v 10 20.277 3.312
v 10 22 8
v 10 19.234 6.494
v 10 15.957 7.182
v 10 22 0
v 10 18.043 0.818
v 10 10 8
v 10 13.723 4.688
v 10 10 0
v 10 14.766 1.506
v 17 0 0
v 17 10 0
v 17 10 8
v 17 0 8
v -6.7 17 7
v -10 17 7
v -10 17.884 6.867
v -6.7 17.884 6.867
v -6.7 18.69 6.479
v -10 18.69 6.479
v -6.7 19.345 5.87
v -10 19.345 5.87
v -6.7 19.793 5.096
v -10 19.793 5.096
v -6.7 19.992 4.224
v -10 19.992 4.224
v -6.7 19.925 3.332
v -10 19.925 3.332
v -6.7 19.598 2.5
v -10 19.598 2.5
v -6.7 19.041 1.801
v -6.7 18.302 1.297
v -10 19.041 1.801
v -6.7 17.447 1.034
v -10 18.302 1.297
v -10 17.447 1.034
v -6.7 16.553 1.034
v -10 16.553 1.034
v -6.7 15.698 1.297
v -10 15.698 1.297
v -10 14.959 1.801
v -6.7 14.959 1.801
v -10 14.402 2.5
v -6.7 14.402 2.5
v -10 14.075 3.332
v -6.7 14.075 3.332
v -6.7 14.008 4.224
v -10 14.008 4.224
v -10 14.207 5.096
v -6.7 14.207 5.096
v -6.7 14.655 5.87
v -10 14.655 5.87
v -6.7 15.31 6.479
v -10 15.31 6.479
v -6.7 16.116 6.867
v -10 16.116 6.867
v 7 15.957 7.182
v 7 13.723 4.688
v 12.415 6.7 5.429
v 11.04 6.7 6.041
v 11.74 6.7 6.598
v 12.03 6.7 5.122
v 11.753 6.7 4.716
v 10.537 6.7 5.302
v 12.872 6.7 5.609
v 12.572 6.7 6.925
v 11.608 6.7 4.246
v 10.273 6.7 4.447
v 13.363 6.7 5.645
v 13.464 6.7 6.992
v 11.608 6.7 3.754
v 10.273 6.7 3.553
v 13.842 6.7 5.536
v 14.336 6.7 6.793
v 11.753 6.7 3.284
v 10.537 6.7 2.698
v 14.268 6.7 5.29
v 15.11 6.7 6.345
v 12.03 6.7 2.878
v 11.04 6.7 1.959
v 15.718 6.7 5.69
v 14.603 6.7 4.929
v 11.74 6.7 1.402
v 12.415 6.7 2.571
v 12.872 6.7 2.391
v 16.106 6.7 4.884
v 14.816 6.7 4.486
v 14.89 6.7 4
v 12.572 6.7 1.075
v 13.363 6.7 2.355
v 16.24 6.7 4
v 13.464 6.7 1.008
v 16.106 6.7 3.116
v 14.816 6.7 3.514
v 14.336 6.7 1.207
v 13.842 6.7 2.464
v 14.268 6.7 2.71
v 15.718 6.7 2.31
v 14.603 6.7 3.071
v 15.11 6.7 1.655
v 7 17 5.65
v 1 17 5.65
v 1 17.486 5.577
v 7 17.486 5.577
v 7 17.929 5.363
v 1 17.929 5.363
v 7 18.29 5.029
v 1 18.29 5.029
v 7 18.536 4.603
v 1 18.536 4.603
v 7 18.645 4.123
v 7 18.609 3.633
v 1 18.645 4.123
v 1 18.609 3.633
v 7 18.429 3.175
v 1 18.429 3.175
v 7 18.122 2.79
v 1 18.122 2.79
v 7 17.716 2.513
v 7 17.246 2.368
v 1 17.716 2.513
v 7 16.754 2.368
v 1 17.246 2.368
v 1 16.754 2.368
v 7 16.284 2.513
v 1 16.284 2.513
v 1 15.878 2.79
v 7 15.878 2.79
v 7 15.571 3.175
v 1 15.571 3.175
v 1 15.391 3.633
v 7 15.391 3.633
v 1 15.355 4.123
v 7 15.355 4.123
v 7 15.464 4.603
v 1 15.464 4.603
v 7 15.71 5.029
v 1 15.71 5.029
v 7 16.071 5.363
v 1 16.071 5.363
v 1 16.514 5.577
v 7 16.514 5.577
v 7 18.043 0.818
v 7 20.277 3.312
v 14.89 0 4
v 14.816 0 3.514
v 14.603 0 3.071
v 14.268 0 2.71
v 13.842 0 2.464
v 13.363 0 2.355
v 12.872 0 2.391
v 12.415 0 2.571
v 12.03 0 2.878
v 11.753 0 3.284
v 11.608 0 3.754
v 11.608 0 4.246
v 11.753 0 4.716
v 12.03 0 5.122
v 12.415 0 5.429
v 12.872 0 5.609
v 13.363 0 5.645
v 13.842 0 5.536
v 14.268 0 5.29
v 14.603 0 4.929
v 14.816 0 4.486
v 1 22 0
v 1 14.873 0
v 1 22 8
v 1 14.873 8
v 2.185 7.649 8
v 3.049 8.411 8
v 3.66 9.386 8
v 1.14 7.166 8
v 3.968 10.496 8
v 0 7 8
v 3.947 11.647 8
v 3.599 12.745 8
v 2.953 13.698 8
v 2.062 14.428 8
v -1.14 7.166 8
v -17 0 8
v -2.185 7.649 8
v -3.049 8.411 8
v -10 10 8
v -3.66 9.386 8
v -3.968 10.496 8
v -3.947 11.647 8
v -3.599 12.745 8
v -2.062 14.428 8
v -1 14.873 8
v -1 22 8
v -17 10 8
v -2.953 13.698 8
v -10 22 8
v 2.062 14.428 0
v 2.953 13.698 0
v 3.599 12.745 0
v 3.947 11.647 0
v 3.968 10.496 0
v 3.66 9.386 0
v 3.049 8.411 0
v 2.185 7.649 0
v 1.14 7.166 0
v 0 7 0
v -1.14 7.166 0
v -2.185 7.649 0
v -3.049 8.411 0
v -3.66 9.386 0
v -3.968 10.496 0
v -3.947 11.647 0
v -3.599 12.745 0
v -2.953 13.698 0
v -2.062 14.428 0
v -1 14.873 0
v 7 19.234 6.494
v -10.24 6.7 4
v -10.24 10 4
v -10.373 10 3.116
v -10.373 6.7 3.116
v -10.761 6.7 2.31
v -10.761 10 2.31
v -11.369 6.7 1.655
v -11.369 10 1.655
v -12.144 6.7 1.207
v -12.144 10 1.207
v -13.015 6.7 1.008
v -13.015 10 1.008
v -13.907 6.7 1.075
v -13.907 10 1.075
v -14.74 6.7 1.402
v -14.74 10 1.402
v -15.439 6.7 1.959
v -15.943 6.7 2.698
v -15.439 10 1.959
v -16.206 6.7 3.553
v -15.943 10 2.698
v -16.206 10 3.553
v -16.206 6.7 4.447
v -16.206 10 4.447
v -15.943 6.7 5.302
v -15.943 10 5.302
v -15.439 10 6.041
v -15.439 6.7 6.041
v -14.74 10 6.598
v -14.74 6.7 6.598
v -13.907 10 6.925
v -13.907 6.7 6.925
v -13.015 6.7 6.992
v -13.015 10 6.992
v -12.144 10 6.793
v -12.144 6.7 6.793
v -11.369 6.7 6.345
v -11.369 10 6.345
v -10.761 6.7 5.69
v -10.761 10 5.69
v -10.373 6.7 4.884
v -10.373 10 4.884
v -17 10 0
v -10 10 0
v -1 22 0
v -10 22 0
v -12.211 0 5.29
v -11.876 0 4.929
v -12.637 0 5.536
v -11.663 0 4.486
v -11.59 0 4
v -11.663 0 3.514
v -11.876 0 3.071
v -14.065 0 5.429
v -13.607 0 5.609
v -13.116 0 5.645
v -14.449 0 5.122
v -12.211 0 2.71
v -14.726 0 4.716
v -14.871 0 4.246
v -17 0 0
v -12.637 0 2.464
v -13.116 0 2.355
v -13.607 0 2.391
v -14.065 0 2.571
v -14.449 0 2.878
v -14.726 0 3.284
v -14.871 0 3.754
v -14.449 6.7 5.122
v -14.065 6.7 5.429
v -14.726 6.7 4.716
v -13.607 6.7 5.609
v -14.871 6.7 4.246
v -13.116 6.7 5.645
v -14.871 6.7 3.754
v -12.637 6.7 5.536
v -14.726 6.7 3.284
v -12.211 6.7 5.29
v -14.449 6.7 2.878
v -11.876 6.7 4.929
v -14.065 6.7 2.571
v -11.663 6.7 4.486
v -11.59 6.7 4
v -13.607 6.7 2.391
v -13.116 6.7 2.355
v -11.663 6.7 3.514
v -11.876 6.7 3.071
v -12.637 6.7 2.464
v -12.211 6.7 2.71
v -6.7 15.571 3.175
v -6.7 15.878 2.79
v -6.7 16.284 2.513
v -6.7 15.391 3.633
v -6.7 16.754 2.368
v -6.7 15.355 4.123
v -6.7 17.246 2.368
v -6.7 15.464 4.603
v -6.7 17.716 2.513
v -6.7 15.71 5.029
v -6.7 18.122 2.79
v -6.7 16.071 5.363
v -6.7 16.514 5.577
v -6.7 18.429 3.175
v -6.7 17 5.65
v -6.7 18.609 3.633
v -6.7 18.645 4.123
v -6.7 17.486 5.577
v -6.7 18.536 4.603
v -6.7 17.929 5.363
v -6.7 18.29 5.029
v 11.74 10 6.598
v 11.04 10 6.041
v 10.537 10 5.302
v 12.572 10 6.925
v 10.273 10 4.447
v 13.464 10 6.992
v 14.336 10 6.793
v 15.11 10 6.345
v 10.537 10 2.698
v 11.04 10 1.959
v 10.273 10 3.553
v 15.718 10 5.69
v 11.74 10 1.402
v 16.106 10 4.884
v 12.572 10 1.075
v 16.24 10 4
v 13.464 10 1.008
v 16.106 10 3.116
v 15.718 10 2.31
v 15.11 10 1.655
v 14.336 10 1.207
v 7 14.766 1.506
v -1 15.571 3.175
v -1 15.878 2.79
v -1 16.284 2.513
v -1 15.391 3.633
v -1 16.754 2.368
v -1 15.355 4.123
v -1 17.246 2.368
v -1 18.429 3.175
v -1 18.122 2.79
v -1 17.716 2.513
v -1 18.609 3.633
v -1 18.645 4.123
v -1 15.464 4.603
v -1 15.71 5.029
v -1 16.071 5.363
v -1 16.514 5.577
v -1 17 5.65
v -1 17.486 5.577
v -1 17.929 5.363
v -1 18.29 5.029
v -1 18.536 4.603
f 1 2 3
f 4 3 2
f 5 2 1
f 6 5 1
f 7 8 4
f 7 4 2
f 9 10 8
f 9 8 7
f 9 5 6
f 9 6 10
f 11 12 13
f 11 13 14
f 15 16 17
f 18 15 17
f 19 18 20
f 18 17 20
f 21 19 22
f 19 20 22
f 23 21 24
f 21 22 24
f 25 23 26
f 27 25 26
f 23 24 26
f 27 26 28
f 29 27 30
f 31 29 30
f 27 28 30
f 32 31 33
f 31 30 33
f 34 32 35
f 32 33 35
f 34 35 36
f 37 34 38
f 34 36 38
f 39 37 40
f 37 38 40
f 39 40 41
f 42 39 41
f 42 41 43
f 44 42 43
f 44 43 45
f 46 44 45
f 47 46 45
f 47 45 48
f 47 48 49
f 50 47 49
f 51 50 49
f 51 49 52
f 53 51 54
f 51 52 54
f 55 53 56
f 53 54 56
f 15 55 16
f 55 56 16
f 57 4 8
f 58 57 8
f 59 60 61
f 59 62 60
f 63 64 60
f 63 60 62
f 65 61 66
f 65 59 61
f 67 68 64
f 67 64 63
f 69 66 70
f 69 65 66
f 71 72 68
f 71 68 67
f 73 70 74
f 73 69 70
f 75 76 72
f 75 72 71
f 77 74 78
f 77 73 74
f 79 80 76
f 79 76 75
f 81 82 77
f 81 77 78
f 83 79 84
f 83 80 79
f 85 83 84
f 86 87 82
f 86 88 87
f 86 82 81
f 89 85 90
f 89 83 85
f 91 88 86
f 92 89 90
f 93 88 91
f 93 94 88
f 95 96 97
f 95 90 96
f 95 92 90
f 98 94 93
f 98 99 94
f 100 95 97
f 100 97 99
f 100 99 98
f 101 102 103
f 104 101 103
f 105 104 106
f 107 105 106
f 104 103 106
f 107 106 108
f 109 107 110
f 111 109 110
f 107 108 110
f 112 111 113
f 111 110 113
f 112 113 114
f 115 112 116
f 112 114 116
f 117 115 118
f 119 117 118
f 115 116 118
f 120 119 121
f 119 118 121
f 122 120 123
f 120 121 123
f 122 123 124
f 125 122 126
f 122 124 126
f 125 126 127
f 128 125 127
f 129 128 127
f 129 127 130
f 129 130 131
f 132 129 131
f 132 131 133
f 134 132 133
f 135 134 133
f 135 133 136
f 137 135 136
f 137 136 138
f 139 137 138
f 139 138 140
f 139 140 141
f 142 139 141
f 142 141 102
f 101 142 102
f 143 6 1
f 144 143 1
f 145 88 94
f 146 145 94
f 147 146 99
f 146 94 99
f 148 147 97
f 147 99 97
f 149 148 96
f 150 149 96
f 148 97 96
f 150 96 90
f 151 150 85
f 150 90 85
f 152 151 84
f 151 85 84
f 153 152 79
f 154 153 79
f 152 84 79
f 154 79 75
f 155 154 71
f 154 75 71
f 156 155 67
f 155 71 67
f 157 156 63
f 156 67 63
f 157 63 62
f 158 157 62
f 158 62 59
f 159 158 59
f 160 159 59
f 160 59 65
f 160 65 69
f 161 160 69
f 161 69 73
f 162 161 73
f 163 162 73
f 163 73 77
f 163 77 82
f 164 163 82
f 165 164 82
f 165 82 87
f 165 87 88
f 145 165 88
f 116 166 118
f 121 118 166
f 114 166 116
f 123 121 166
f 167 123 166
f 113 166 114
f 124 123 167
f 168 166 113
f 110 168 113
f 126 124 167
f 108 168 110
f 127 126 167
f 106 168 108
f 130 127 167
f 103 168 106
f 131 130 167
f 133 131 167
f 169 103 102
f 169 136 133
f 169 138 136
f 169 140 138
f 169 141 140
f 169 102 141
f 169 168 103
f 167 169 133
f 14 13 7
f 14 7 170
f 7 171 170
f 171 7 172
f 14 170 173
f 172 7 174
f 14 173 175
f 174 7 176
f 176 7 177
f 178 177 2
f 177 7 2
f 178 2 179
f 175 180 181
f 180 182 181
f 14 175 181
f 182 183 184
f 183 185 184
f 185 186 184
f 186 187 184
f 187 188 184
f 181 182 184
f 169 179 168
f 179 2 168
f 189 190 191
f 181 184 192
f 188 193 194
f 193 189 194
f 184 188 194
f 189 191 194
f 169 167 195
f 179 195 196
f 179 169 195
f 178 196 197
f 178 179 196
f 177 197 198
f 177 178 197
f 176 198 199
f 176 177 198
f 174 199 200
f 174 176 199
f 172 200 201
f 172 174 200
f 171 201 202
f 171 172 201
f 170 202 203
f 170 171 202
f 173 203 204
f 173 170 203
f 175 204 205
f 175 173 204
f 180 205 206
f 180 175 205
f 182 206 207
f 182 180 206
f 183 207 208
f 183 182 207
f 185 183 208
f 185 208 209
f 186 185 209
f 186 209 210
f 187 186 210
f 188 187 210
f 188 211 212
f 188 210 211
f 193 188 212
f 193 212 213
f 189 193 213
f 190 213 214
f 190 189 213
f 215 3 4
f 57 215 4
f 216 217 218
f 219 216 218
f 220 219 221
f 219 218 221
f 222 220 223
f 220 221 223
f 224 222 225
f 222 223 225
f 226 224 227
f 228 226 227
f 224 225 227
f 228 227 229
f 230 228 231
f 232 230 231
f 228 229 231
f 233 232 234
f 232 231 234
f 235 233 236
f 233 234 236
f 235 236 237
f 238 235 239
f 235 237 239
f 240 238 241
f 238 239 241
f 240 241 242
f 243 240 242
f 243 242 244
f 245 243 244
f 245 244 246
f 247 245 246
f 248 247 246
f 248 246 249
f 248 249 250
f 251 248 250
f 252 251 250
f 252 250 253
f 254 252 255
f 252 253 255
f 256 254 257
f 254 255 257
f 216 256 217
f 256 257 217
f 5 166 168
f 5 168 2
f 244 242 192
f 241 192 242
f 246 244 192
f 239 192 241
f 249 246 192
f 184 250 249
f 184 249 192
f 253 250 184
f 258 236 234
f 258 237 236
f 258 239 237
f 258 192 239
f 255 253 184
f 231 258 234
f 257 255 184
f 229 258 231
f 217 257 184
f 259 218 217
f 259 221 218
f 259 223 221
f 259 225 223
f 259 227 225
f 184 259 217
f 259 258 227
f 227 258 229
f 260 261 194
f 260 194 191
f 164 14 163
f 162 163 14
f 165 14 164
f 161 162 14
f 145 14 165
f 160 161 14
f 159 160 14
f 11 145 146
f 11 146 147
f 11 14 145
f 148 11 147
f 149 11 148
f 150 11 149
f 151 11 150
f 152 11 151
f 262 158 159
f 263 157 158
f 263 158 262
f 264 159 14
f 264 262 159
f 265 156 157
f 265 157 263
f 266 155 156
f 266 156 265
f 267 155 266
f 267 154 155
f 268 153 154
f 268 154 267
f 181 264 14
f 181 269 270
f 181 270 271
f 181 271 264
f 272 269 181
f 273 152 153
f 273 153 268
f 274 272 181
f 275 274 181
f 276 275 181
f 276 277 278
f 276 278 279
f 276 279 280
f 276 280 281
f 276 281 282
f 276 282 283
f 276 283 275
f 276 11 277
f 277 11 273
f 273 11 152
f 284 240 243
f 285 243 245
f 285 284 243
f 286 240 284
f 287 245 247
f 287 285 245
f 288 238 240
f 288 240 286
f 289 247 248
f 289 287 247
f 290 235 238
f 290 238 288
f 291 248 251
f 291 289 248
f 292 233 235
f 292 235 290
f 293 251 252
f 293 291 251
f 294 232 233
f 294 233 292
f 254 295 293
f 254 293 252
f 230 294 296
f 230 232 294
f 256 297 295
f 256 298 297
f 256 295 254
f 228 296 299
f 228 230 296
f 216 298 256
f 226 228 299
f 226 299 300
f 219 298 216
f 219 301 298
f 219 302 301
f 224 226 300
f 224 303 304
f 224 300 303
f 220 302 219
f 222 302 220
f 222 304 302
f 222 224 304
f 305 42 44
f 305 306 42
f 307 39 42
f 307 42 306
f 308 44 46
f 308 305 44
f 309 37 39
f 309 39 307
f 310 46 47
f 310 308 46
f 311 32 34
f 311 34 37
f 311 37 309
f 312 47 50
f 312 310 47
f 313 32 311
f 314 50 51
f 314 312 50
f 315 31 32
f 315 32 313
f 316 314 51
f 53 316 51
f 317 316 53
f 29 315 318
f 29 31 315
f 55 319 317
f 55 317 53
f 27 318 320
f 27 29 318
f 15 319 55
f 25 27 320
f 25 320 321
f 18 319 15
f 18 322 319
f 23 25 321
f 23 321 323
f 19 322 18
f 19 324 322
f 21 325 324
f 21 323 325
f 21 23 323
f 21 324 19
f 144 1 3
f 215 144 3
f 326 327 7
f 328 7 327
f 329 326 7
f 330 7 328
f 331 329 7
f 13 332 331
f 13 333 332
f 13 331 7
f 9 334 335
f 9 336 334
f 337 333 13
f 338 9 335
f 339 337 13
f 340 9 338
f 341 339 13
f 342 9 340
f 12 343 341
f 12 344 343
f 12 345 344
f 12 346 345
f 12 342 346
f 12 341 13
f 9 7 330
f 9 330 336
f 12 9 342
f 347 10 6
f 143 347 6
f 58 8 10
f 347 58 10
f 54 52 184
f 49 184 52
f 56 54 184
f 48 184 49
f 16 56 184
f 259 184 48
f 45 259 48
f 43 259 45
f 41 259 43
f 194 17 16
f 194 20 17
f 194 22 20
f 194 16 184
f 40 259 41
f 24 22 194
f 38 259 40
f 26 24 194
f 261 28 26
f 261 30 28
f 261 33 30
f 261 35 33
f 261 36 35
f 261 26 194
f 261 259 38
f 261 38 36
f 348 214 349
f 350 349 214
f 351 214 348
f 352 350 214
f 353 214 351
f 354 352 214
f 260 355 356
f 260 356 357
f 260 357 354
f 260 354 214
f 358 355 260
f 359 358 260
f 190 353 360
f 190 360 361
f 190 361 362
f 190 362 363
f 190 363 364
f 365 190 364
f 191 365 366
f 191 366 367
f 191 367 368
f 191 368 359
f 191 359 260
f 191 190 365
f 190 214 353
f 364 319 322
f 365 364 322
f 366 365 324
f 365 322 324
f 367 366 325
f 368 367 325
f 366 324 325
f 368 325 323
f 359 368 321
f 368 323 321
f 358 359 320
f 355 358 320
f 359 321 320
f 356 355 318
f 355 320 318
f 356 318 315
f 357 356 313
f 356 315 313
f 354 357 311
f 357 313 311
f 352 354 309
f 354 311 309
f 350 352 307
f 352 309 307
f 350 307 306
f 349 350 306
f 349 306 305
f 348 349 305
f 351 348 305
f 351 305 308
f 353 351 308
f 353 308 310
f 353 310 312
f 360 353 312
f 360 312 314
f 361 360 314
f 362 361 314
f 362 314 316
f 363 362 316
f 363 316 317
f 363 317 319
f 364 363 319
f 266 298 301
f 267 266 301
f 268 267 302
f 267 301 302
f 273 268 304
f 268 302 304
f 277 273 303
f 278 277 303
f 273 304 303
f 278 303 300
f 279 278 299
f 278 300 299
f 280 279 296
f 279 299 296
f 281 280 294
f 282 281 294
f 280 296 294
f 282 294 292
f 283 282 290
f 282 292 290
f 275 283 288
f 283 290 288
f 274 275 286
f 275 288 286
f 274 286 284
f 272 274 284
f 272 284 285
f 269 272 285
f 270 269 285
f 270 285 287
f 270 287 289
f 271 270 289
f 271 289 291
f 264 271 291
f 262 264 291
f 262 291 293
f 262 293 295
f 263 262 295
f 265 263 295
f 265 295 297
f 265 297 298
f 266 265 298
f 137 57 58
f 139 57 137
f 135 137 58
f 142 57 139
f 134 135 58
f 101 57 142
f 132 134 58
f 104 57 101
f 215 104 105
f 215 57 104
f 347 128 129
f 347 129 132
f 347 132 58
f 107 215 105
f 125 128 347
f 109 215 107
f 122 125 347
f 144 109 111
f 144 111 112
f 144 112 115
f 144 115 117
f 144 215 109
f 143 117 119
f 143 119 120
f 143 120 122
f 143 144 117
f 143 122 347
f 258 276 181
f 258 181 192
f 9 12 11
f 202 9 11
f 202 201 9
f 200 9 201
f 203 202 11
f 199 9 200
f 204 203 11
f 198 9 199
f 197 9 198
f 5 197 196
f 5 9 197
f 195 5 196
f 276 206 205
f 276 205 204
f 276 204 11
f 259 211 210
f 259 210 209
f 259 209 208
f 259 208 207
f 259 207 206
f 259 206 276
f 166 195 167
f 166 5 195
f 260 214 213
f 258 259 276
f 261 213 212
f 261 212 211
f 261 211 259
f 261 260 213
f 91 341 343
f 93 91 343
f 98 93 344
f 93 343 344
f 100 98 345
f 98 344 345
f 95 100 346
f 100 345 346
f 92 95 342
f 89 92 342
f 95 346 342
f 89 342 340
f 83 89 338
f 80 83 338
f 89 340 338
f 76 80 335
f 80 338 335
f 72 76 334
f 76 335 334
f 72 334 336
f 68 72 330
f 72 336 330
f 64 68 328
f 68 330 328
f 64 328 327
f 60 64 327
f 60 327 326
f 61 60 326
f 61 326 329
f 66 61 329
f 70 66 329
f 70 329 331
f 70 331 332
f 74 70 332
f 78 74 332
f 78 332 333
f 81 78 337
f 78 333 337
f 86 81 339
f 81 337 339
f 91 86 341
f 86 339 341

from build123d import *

# Parameters (mm, degrees)
EXTRUDE_1_DEPTH     = 8
CUT_EXTRUDE_1_DEPTH = 9
SKETCH_3_R          = 1.65
CUT_EXTRUDE_2_DEPTH = 28
SKETCH_4_R          = 3
CUT_EXTRUDE_3_DEPTH = 3.3
CUT_EXTRUDE_4_DEPTH = 3
SKETCH_6_R          = 1.65
CUT_EXTRUDE_5_DEPTH = 11
SKETCH_7_R          = 3
CUT_EXTRUDE_6_DEPTH = 3.3


with BuildPart() as part:
    # 草图1 → 凸台-拉伸1 (new body)
    with BuildSketch(Plane.XY):
        Polygon((-10, 22), (10, 22), (10, 10), (17, 10), (17, 0), (-17, 0), (-17, 10), (-10, 10), align=None)
    extrude(amount=EXTRUDE_1_DEPTH)

    # 草图2 → 切除-拉伸1 (cut, through all)
    with BuildSketch(Plane.XY.offset(8)):
        with BuildLine():
            Line((-1, 22), (1, 22))
            Line((1, 22), (1, 14.872983346))
            ThreePointArc((1, 14.872983346), (0, 7), (-1, 14.872983346))
            Line((-1, 14.872983346), (-1, 22))
        make_face()
    extrude(amount=-CUT_EXTRUDE_1_DEPTH, mode=Mode.SUBTRACT)

    # 草图3 → 切除-拉伸2 (cut, through all)
    with BuildSketch(Plane.ZY.offset(10)):
        with Locations((4, 17)):
            Circle(SKETCH_3_R)
    extrude(amount=-CUT_EXTRUDE_2_DEPTH, mode=Mode.SUBTRACT)

    # 草图4 → 切除-拉伸3 (cut)
    with BuildSketch(Plane.ZY.offset(10)):
        with Locations((4, 17)):
            Circle(SKETCH_4_R)
    extrude(amount=-CUT_EXTRUDE_3_DEPTH, mode=Mode.SUBTRACT)

    # 草图5 → 切除-拉伸4 (cut)
    with BuildSketch(Plane(origin=(10, 0, 0), x_dir=(0, 0, -1), z_dir=(1, 0, 0))):
        Polygon((-6.494110918, 19.234444912), (-7.182141516, 15.957259041), (-4.688030598, 13.72281413), (-1.505889082, 14.765555088), (-0.817858484, 18.042740959), (-3.311969402, 20.27718587), align=None)
    extrude(amount=-CUT_EXTRUDE_4_DEPTH, mode=Mode.SUBTRACT)

    # 草图6 → 切除-拉伸5 (cut, through all)
    with BuildSketch(Plane(origin=(0, 10, 0), x_dir=(1, 0, 0), z_dir=(0, 1, 0))):
        with Locations((-13.239613272, -4)):
            Circle(SKETCH_6_R)
        with Locations((13.239613272, -4)):
            Circle(SKETCH_6_R)
    extrude(amount=-CUT_EXTRUDE_5_DEPTH, mode=Mode.SUBTRACT)

    # 草图7 → 切除-拉伸6 (cut)
    with BuildSketch(Plane(origin=(0, 10, 0), x_dir=(1, 0, 0), z_dir=(0, 1, 0))):
        with Locations((13.239613272, -4)):
            Circle(SKETCH_7_R)
        with Locations((-13.239613272, -4)):
            Circle(SKETCH_7_R)
    extrude(amount=-CUT_EXTRUDE_6_DEPTH, mode=Mode.SUBTRACT)


solid = part.part
